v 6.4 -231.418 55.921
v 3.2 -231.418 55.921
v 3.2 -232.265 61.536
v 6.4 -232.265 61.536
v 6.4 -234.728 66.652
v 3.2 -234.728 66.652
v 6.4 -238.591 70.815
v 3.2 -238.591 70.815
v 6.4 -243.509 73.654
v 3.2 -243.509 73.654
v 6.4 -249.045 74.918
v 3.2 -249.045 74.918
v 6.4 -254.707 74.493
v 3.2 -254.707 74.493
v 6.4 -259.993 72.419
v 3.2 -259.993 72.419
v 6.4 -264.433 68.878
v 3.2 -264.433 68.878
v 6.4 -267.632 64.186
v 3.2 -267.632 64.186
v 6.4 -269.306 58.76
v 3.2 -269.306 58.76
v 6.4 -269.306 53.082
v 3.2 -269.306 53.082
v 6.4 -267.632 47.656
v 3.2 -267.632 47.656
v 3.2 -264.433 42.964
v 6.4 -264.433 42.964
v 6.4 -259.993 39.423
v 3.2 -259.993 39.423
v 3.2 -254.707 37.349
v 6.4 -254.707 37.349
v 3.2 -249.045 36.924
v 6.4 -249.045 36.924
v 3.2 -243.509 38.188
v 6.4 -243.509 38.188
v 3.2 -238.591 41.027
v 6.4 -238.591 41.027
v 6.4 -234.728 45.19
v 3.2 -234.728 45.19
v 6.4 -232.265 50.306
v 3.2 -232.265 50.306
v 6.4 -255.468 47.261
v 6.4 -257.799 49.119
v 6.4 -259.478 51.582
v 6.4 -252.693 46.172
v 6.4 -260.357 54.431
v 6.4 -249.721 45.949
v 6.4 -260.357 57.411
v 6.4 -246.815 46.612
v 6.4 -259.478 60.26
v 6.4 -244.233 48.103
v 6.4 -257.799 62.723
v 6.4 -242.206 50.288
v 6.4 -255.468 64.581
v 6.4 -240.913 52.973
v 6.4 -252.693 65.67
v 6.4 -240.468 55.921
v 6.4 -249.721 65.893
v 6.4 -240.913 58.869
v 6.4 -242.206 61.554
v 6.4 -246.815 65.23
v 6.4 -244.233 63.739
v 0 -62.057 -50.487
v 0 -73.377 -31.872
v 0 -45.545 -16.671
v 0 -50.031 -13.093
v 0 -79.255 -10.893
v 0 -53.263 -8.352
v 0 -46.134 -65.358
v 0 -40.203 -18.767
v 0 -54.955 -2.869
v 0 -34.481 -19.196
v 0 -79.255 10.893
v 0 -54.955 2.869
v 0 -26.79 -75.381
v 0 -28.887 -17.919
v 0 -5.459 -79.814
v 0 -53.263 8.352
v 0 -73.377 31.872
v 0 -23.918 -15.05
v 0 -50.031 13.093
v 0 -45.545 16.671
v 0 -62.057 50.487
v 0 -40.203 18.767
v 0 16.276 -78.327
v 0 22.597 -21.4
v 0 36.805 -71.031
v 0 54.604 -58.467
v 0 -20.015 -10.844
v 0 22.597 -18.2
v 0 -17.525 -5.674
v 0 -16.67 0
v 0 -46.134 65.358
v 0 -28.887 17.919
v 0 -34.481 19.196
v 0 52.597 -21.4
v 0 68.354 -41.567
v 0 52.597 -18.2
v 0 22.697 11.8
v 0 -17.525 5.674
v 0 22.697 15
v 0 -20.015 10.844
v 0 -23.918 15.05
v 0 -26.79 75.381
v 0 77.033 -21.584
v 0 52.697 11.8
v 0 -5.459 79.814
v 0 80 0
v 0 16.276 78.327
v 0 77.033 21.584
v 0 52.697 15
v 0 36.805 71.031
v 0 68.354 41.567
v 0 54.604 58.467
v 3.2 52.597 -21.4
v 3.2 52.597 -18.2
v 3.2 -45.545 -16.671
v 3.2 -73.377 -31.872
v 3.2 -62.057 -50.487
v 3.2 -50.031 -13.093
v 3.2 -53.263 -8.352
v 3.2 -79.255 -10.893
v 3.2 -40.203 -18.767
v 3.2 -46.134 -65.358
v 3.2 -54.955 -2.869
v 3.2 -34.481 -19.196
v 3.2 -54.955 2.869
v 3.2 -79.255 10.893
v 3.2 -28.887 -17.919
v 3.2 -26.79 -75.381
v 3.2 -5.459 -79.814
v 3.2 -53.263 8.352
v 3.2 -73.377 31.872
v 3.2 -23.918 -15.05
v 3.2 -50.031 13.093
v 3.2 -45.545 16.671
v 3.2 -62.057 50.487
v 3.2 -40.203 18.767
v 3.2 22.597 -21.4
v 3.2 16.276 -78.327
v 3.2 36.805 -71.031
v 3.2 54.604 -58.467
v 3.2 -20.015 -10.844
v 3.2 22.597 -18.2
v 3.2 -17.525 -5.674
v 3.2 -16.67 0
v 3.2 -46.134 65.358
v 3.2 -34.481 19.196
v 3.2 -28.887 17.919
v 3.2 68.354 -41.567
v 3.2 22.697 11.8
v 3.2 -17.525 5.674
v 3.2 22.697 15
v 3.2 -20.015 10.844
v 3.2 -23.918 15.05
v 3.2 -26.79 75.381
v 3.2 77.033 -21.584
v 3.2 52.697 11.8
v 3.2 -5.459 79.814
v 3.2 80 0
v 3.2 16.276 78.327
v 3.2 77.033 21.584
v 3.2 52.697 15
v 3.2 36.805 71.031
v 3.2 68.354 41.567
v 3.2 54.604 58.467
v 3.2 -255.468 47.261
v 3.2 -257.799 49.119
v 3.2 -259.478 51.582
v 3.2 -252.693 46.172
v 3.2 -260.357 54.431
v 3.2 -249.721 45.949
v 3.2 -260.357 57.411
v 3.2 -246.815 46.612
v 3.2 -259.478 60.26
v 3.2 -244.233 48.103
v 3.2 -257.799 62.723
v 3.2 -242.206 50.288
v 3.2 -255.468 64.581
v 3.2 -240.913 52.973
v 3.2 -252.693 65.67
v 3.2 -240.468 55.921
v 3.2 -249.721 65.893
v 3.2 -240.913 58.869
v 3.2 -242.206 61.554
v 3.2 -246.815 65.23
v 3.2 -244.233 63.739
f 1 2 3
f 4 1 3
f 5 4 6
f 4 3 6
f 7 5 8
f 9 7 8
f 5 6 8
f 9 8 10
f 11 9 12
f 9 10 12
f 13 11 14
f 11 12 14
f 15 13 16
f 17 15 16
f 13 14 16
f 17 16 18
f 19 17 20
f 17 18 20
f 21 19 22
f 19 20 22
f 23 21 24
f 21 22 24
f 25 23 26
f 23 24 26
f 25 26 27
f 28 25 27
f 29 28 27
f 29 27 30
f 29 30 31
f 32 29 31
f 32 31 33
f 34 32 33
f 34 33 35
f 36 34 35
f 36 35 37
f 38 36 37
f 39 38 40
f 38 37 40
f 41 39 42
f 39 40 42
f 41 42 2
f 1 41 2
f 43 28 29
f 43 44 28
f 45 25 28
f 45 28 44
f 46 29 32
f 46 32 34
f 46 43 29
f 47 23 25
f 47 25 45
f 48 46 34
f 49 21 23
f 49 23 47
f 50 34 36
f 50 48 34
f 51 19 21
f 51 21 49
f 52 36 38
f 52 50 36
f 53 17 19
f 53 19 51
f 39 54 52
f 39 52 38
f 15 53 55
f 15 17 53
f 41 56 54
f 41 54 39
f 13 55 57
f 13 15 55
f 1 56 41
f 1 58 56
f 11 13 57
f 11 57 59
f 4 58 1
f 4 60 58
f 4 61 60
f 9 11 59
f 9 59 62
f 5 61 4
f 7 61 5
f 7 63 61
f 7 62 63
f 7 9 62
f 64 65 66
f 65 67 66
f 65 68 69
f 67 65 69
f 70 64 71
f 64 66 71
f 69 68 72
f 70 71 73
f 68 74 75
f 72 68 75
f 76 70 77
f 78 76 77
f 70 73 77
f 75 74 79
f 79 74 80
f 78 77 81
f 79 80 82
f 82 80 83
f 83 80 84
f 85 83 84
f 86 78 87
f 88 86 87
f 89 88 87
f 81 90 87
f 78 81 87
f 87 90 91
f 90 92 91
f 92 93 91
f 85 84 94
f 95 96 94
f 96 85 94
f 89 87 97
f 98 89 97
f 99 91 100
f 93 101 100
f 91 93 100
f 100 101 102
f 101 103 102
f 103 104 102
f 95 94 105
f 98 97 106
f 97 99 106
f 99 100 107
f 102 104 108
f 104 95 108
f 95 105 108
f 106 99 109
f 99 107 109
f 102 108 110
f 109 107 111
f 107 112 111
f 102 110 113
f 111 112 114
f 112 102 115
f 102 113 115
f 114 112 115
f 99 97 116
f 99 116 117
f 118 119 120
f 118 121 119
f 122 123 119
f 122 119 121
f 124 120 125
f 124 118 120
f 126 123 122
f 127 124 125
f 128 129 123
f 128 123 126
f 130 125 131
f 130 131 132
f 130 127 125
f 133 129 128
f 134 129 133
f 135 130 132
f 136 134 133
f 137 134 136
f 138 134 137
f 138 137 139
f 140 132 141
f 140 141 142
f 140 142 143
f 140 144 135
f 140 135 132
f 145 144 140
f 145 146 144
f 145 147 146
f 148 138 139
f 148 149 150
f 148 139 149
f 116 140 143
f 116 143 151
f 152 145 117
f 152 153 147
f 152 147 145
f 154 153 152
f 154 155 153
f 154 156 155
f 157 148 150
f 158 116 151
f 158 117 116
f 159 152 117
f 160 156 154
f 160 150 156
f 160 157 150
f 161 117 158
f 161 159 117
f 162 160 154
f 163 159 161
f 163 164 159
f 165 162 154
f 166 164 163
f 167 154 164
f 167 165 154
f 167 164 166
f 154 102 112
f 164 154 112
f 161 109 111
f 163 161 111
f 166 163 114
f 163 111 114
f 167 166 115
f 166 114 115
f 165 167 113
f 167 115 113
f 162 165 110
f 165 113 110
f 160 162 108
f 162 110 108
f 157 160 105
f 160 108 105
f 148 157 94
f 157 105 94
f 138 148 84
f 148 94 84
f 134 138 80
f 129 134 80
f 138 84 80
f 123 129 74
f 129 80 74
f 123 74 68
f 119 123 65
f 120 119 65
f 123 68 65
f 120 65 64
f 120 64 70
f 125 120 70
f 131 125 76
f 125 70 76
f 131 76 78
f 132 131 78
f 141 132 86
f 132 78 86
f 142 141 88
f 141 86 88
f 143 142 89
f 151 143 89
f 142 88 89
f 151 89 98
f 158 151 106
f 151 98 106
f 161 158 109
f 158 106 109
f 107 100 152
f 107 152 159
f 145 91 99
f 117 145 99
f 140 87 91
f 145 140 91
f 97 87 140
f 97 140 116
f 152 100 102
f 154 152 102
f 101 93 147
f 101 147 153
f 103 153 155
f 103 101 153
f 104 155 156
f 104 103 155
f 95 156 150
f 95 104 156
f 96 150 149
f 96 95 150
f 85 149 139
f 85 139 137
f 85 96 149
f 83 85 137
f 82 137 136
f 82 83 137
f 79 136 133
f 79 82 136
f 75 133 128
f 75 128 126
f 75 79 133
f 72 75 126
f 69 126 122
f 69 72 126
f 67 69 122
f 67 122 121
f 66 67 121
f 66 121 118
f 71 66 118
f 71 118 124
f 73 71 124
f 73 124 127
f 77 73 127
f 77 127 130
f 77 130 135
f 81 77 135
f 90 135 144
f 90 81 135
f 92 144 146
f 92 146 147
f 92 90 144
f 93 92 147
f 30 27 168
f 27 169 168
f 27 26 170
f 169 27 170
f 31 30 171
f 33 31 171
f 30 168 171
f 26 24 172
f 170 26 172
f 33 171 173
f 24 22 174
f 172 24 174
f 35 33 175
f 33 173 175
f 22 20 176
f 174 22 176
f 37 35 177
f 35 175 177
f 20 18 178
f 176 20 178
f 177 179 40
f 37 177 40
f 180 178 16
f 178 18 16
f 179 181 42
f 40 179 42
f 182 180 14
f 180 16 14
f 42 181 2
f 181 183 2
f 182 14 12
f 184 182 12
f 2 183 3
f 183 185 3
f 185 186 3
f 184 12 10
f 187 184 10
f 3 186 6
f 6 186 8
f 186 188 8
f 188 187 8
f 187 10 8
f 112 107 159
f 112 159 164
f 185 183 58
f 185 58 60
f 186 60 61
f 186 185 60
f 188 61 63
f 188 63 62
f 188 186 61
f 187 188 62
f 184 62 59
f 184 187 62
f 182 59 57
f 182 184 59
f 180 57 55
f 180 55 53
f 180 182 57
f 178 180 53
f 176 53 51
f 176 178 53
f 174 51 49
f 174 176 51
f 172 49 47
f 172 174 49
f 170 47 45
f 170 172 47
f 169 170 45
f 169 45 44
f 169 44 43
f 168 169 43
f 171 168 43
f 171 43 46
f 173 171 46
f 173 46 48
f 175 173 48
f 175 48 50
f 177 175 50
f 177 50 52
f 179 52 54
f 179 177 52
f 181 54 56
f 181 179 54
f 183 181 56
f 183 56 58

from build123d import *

# Parameters (mm, degrees)
F0_R     = 80
F0_W     = 30
F0_H     = 3.2
F0_R_2   = 19.25
F1_DEPTH = 3.2
F2_R     = 19.05
F2_R_2   = 10
F3_DEPTH = 3.2


with BuildPart() as f1:
    # F0 (on Right) → F1 (new body)
    with BuildSketch(Plane.YZ):
        Circle(F0_R)
        with Locations((37.596961, -19.8)):
            Rectangle(F0_W, F0_H, mode=Mode.SUBTRACT)
        with Locations((-35.919704, 0)):
            Circle(F0_R_2, mode=Mode.SUBTRACT)
        with Locations((37.69696, 13.4)):
            Rectangle(F0_W, F0_H, mode=Mode.SUBTRACT)
    extrude(amount=F1_DEPTH)


with BuildPart() as f3:
    # F2 (on face) → F3 (new body)
    with BuildSketch(Plane.YZ.offset(3.2)):
        with Locations((-250.468284, 55.920999)):
            Circle(F2_R)
        with Locations((-250.468284, 55.920999)):
            Circle(F2_R_2, mode=Mode.SUBTRACT)
    extrude(amount=F3_DEPTH)


solid = Compound([f1.part, f3.part])
